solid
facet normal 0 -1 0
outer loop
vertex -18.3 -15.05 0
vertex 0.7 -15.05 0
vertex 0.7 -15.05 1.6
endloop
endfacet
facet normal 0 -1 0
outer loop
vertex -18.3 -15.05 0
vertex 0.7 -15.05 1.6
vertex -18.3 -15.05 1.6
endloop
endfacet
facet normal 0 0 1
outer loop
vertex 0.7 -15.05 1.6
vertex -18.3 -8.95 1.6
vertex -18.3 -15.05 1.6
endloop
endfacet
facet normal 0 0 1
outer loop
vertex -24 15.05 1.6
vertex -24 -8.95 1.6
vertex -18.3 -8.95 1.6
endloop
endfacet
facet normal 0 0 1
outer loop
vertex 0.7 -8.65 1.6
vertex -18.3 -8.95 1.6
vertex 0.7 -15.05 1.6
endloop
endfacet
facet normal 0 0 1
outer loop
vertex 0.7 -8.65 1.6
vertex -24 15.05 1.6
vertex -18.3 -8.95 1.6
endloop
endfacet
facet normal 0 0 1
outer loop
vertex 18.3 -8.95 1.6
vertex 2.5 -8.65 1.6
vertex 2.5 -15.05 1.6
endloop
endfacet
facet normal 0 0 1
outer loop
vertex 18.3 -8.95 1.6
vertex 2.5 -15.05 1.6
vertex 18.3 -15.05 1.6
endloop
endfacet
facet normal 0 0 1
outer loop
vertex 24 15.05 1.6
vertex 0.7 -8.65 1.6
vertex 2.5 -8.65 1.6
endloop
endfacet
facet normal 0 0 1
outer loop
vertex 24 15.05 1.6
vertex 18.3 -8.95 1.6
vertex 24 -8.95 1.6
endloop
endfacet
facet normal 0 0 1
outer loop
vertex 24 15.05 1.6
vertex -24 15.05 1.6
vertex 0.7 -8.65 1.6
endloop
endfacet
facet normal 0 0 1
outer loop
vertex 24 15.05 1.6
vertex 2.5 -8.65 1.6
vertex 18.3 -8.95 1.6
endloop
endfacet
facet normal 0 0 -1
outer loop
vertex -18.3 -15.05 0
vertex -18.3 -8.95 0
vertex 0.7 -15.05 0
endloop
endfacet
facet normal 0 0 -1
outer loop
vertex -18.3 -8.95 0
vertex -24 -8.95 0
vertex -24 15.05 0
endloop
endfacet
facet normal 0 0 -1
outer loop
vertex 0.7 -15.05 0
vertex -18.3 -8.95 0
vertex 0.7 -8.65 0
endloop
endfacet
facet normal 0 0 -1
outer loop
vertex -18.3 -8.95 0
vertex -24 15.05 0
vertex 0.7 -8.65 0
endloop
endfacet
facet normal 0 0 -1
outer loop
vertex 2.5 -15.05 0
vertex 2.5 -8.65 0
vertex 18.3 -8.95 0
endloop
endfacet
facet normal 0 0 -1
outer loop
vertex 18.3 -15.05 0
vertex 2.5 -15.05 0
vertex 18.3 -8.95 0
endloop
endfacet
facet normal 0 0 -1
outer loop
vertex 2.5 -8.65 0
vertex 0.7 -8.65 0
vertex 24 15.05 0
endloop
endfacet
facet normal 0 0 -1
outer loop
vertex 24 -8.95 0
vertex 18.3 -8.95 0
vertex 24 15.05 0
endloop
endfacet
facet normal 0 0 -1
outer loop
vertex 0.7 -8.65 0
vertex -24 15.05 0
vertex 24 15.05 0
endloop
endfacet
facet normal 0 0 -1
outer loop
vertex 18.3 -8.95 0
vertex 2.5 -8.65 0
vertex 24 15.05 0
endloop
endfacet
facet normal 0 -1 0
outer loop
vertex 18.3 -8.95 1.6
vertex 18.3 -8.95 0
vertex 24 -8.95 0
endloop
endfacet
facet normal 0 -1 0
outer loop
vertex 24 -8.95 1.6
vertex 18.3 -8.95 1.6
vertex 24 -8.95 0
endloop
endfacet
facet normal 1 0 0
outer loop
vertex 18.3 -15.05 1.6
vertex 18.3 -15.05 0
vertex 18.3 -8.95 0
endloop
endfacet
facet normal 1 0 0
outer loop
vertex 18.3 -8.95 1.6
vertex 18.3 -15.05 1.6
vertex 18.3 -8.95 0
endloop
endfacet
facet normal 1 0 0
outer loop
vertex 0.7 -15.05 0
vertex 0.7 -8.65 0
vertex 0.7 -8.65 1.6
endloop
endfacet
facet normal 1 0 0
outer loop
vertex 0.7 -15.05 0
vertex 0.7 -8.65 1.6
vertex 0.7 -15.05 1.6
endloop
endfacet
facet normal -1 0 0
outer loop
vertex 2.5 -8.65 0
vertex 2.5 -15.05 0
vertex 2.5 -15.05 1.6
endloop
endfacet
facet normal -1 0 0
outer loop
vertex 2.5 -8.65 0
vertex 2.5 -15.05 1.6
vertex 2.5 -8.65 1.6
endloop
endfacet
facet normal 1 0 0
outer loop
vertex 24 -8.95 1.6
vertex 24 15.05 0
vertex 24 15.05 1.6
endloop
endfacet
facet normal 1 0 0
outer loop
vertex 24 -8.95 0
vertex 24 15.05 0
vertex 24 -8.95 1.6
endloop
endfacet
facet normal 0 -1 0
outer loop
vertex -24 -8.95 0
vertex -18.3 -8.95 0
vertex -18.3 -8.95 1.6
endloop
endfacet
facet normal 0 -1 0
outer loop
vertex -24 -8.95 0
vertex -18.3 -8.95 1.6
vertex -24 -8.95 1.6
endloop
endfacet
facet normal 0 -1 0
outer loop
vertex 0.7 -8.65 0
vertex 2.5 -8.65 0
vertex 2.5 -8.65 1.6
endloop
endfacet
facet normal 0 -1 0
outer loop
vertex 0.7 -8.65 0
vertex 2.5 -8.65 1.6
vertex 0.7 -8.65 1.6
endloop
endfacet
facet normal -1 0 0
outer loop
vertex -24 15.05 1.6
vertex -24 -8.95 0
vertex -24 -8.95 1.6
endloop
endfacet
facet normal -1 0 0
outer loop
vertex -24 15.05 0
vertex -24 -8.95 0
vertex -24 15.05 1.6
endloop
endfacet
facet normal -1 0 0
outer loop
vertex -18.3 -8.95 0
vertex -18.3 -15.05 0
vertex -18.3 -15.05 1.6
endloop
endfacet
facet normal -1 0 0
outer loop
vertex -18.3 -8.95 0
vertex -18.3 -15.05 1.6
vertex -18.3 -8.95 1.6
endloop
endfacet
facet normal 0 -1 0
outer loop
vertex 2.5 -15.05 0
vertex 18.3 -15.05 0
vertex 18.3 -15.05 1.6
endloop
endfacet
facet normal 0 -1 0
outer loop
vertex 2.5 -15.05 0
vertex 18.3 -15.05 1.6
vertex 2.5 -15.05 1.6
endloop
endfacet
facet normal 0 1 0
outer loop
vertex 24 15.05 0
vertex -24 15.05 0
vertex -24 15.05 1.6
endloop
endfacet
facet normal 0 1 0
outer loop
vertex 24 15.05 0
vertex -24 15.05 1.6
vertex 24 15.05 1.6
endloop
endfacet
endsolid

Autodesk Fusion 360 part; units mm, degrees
sketch "Sketch1" plane through (0, 0, 0) normal (0, 0, 1) x (1, 0, 0)
  line L0 (24, -15.05) -> (-24, -15.05)
  line L1 (-24, -15.05) -> (-24, 15.05)
  line L2 (-24, 15.05) -> (24, 15.05)
  line L3 (24, 15.05) -> (24, -15.05)
  line L4 (24, -15.05) -> (-24, 15.05) construction
  line L5 (-24, -15.05) -> (24, 15.05) construction
  line L6 (24, -15.05) -> (18.3, -15.05)
  line L7 (18.3, -15.05) -> (18.3, -8.95)
  line L8 (18.3, -8.95) -> (24, -8.95)
  line L9 (-24, -15.05) -> (-18.3, -15.05)
  line L10 (-18.3, -15.05) -> (-18.3, -8.95)
  line L11 (-18.3, -8.95) -> (-24, -8.95)
  line L12 (-18.3, -15.05) -> (0.7, -15.05)
  line L13 (18.3, -15.05) -> (2.5, -15.05)
  line L14 (2.5, -15.05) -> (2.5, -8.65)
  line L15 (2.5, -8.65) -> (0.7, -8.65)
  line L16 (0.7, -8.65) -> (0.7, -15.05)
  dimension "d1" = 48
  dimension "d2" = 30.1
  dimension "d3" = 5.7
  dimension "d4" = 6.1
  dimension "d5" = 5.7
  dimension "d6" = 6.1
  dimension "d7" = 19
  dimension "d8" = 15.8
  dimension "d9" = 6.4
extrude "Extrude1" add sketch "Sketch1" along normal blind 1.6 contours L0 L1 L2 L3 L7 L8 L10 L11 L12 L13 L14 L15 L16
